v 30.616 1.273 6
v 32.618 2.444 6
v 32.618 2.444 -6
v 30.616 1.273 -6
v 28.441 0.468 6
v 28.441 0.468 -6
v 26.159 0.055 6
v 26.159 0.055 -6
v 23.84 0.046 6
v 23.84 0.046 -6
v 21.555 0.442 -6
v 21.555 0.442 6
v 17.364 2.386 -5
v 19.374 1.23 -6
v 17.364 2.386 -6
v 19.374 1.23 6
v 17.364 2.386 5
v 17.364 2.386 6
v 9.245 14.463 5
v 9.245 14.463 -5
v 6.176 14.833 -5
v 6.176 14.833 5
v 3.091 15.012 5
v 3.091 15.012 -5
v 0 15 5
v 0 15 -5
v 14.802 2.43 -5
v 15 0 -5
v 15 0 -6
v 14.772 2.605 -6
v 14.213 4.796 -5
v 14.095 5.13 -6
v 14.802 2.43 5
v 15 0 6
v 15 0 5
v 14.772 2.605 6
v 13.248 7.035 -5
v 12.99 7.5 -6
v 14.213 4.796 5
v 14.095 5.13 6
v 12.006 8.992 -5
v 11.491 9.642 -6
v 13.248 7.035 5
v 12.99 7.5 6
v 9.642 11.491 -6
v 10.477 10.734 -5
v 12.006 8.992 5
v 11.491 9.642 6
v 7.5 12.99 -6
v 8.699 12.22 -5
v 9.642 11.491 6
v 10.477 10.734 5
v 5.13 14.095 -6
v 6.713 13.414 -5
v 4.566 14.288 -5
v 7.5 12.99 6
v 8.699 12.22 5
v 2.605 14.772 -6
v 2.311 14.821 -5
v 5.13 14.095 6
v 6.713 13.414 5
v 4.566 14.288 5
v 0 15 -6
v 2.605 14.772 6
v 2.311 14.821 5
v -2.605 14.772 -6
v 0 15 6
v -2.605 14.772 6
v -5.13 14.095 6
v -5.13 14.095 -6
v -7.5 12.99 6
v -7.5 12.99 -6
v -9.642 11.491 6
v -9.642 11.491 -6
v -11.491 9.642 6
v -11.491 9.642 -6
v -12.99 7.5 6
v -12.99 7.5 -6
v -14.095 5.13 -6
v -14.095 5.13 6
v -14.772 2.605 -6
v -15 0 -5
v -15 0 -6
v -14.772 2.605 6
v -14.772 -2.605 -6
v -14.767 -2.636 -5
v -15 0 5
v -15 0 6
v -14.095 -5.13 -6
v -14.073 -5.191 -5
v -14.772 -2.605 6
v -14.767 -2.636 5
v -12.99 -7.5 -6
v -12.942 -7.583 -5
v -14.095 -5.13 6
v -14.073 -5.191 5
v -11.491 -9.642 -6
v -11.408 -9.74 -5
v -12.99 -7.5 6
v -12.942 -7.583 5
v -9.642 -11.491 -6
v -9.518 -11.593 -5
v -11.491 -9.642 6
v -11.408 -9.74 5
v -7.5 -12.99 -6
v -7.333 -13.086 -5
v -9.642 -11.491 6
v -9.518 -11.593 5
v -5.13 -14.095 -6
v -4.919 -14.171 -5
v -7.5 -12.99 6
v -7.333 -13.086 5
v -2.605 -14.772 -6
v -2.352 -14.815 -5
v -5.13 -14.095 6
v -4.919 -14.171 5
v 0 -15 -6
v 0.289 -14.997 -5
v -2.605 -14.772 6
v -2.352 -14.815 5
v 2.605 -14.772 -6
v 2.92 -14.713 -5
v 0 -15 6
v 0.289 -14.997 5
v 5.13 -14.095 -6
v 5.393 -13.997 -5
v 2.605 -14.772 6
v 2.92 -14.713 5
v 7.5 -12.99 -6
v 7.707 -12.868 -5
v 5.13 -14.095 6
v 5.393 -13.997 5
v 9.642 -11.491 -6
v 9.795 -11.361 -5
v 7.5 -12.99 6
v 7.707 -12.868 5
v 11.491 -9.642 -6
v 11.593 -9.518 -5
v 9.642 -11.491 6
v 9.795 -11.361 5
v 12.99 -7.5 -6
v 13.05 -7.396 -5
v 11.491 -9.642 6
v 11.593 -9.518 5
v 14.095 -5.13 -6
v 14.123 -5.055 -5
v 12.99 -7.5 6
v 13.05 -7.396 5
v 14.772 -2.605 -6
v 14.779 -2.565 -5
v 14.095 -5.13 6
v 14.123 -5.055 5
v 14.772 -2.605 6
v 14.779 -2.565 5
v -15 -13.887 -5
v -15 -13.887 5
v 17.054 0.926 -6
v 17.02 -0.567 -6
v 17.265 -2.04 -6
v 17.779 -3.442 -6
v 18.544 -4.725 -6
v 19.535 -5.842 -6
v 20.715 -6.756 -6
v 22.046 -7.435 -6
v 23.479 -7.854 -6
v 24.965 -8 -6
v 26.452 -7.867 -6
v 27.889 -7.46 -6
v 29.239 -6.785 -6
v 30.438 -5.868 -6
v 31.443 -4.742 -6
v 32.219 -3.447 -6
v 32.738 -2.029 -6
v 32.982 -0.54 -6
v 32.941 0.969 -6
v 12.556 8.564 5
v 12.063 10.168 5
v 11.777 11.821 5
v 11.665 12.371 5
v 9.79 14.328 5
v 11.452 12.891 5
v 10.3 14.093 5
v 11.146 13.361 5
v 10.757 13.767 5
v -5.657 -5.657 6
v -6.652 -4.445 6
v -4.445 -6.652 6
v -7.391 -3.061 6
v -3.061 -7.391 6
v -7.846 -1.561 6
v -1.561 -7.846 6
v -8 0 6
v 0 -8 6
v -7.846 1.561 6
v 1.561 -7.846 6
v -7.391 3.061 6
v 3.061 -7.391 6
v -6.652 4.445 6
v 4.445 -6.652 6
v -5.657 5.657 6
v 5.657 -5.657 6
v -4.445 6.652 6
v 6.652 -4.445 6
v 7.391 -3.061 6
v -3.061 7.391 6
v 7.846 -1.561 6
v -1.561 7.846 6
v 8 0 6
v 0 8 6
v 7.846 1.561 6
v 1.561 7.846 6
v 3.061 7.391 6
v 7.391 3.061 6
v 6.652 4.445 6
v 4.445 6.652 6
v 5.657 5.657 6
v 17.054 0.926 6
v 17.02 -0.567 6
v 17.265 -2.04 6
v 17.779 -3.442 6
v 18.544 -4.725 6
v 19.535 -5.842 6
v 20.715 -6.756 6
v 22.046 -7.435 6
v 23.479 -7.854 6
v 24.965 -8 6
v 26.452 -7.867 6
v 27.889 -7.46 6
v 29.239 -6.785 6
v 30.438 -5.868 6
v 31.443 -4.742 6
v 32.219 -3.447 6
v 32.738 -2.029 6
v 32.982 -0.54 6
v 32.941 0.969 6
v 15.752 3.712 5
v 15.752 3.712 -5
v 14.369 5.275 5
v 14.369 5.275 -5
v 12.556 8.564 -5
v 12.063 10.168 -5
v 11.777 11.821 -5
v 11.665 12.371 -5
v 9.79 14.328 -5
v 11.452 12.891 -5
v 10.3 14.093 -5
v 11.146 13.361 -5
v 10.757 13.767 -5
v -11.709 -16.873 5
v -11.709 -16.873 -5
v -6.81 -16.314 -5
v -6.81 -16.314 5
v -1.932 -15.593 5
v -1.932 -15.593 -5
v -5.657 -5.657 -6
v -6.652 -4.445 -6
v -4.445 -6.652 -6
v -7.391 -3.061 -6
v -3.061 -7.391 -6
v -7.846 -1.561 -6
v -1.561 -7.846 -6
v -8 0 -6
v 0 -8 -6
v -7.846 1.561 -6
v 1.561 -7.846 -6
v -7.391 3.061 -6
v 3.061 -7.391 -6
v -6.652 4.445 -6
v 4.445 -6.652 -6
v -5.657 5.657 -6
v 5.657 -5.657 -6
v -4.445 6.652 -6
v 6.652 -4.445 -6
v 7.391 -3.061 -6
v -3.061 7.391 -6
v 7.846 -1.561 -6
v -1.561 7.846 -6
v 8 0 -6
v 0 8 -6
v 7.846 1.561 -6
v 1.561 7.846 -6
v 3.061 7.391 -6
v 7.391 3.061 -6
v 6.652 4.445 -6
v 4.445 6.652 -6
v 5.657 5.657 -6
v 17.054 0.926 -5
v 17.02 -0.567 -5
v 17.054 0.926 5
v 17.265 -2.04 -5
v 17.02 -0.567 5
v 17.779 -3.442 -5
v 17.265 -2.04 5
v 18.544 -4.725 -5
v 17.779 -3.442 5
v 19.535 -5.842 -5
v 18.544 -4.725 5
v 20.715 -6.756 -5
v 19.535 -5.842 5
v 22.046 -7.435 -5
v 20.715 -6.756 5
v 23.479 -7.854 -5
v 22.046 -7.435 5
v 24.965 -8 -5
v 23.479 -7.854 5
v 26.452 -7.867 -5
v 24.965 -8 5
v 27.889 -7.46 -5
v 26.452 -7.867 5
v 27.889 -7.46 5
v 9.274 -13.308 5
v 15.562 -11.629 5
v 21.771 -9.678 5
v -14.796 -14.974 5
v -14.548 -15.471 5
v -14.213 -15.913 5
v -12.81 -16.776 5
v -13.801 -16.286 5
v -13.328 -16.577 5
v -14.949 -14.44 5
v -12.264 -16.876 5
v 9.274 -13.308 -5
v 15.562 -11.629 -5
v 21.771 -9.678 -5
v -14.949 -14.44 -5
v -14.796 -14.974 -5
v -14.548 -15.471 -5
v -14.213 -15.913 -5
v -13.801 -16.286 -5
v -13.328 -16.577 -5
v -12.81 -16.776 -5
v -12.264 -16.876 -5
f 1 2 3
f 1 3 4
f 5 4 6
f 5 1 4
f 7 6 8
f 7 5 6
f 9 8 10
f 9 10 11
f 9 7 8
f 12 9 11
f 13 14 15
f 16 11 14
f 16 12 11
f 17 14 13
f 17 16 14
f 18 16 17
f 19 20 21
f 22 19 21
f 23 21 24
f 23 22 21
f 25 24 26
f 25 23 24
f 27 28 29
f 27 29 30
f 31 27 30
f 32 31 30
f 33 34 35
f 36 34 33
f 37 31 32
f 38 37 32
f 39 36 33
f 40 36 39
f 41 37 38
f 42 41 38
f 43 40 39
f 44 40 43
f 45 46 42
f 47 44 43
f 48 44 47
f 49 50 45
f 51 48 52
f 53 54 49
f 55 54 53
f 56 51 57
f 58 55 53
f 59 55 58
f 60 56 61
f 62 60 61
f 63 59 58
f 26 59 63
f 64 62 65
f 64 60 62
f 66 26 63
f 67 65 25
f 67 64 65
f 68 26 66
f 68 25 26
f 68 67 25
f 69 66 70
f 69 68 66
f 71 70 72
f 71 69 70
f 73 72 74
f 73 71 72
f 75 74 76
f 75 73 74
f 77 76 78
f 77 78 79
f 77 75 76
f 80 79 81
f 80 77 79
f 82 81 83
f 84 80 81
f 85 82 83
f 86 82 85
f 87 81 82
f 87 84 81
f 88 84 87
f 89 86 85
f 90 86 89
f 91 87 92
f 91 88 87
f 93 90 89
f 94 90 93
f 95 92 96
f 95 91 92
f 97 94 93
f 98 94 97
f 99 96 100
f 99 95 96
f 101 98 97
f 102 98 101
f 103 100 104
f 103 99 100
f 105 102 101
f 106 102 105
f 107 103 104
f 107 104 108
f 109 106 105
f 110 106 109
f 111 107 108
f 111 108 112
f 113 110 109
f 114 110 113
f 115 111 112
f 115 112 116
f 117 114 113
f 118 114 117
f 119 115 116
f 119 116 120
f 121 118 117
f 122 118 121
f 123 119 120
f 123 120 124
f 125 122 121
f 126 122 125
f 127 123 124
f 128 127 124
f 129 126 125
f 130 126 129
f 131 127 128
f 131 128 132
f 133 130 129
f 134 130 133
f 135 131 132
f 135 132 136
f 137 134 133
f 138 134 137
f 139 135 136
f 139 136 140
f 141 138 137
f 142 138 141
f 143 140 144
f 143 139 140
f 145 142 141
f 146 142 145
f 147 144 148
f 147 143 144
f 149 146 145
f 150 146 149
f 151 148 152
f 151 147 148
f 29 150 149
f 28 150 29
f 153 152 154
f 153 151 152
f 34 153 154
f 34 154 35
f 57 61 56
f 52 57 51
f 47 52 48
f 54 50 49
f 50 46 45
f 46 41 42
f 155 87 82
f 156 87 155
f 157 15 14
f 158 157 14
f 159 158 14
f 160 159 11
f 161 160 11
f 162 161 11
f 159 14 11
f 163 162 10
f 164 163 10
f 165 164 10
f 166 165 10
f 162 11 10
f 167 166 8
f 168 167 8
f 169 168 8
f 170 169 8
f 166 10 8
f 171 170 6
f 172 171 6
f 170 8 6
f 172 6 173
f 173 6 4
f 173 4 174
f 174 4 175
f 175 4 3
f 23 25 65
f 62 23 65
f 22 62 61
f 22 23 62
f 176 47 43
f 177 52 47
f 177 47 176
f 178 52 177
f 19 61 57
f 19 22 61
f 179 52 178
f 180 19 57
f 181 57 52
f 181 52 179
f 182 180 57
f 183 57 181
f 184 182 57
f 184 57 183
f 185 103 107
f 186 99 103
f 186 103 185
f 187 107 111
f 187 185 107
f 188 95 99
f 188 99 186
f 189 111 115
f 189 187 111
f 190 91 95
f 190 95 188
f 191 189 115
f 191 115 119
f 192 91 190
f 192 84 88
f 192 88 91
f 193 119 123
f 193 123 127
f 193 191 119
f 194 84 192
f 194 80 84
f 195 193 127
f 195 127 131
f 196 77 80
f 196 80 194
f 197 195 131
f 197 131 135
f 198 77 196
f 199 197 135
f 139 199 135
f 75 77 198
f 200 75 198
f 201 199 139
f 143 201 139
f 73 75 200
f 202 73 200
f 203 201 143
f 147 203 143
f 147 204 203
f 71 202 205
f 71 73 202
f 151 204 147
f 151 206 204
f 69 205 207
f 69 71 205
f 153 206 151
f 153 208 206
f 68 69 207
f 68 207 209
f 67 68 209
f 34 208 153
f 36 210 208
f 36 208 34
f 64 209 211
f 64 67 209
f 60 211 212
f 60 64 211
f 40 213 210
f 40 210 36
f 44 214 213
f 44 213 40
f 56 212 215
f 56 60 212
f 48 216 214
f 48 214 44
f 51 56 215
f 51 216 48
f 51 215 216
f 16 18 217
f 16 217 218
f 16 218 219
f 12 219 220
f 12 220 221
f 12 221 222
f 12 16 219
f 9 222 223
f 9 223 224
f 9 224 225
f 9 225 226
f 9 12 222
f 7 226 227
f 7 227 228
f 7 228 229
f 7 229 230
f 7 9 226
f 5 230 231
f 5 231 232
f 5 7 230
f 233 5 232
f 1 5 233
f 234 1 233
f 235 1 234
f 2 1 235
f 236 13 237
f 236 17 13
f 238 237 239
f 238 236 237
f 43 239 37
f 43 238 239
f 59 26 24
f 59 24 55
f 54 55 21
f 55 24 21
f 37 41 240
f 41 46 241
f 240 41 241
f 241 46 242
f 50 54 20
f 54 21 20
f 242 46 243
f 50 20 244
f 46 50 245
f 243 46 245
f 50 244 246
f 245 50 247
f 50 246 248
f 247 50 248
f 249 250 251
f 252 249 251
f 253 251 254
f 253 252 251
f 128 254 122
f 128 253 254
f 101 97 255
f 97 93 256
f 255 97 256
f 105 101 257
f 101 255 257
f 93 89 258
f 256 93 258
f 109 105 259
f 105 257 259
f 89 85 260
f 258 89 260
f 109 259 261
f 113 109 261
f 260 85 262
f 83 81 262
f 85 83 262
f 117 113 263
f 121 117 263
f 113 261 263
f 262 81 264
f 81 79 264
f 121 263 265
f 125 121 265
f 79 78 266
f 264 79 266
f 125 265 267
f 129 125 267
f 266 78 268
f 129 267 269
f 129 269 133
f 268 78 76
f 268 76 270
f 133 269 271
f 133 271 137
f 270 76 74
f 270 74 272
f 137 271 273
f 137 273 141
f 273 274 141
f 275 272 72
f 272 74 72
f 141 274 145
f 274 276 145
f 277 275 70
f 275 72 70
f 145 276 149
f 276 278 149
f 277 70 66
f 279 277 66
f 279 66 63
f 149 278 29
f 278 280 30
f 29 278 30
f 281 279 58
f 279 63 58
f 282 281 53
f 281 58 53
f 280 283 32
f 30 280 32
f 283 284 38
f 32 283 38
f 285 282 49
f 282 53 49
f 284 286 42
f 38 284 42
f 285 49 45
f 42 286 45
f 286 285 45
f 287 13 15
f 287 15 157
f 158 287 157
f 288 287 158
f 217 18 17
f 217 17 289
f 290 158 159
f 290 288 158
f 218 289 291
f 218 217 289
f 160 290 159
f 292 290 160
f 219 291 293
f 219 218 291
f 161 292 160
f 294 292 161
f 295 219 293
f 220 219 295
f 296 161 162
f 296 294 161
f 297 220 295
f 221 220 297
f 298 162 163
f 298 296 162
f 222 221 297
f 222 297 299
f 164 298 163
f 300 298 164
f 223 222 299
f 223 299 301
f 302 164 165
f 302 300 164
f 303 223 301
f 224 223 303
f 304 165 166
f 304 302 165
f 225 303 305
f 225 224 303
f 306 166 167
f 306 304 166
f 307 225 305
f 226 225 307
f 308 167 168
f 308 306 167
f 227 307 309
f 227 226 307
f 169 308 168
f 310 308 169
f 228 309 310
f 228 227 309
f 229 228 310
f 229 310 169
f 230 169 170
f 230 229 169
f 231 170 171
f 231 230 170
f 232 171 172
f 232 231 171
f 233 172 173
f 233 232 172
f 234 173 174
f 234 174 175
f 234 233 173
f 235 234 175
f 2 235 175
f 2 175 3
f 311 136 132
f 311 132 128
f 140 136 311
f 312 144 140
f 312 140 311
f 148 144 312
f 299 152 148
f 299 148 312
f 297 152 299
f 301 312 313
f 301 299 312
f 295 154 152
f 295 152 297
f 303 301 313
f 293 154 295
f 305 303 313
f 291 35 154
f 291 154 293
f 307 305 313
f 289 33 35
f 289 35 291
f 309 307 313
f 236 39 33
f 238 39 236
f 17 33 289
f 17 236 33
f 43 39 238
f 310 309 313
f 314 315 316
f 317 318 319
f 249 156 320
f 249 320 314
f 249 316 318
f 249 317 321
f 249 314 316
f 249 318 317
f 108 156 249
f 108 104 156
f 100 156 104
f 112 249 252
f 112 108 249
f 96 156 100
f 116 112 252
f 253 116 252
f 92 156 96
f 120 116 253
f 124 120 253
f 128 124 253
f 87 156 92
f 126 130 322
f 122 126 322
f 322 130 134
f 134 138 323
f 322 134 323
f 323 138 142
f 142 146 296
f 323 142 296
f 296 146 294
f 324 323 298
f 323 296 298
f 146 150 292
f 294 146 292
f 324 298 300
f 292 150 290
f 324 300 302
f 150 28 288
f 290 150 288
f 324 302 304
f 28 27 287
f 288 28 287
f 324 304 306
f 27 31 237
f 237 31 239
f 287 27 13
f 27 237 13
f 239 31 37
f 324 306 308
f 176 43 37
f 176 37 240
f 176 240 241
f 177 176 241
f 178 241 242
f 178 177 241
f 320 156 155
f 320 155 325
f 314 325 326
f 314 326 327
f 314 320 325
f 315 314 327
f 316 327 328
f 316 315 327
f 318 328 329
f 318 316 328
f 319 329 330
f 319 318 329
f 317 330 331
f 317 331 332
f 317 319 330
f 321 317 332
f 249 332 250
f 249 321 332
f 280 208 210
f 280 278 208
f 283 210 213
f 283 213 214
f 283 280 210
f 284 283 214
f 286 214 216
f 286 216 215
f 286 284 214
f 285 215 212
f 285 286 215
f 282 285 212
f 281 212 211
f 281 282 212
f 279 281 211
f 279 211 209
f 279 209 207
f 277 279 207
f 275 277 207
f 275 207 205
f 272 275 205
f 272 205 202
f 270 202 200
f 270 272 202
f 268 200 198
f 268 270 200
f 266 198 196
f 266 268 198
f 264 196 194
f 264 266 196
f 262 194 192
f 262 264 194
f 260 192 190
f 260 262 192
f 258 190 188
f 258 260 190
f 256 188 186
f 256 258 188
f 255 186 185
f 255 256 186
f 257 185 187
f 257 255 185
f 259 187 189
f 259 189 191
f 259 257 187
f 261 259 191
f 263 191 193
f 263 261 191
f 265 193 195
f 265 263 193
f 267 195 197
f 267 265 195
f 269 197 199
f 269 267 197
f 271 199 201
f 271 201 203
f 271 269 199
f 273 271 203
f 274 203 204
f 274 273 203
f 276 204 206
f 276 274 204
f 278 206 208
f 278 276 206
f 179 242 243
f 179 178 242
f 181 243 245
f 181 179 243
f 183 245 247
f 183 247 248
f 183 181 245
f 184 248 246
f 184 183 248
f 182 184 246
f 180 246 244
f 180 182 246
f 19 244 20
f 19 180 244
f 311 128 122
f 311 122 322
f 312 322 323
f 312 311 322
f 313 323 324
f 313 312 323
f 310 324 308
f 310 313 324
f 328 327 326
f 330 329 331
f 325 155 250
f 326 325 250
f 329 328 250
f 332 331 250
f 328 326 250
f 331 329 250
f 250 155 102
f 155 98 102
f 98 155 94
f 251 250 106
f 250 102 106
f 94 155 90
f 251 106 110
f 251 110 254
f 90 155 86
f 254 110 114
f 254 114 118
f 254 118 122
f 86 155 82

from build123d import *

# Parameters (mm, degrees)
SKETCH_1_R      = 15
SKETCH_1_R_2    = 8
EXTRUDE_1_DEPTH = 6
EXTRUDE_3_DEPTH = 6
EXTRUDE_4_DEPTH = 5


with BuildPart() as part:
    # 草图1 → 凸台-拉伸1 (new, symmetric)
    with BuildSketch(Plane.XY):
        Circle(SKETCH_1_R)
        Circle(SKETCH_1_R_2, mode=Mode.SUBTRACT)
    extrude(amount=EXTRUDE_1_DEPTH, both=True)



with BuildPart() as body_2:
    # 草图2 → 凸台-拉伸3 (new, symmetric)
    with BuildSketch(Plane.XY):
        with BuildLine():
            ThreePointArc((17.364190492, 2.386296955), (19.534557037, -5.841997366), (27.889014085, -7.460133888))
            ThreePointArc((27.889014085, -7.460133888), (32.219376902, -3.446824212), (32.617582381, 2.443857334))
            ThreePointArc((32.617582381, 2.443857334), (25, 0), (17.364190492, 2.386296955))
        make_face()
    extrude(amount=EXTRUDE_3_DEPTH, both=True)


with BuildPart() as part_1:
    add(part.part)

    add(body_2.part)  # 凸台-拉伸4 merges body 2
    # 草图2<4> → 凸台-拉伸4 (add, symmetric)
    with BuildSketch(Plane.XY):
        with BuildLine():
            ThreePointArc((2.920001822, -14.713041472), (-9.51840251, -11.593101986), (-15, 0))
            Line((-15, 0), (-15, -13.8873794))
            ThreePointArc((-15, -13.8873794), (-14.015653031, -16.10934764), (-11.708571429, -16.873190745))
            ThreePointArc((-11.708571429, -16.873190745), (-4.367649809, -15.973488812), (2.920001822, -14.713041472))
        make_face()
        with BuildLine():
            ThreePointArc((9.245195089, 14.463447909), (4.635046482, 14.946228489), (0, 15))
            ThreePointArc((0, 15), (7.728834811, 12.855547926), (13.247787509, 7.035348329))
            ThreePointArc((13.247787509, 7.035348329), (12.284448117, 9.358081475), (11.777275068, 11.820983737))
            ThreePointArc((11.777275068, 11.820983737), (10.960851201, 13.57305004), (9.245195089, 14.463447909))
        make_face()
        with BuildLine():
            ThreePointArc((13.247787509, 7.035348329), (13.549814305, -6.434479956), (2.920001822, -14.713041472))
            ThreePointArc((2.920001822, -14.713041472), (15.561957057, -11.62862528), (27.889014085, -7.460133888))
            ThreePointArc((27.889014085, -7.460133888), (19.534557037, -5.841997366), (17.364190492, 2.386296955))
            ThreePointArc((17.364190492, 2.386296955), (15.029800011, 4.466277015), (13.247787509, 7.035348329))
        make_face()
    extrude(amount=EXTRUDE_4_DEPTH, both=True)


solid = part_1.part
